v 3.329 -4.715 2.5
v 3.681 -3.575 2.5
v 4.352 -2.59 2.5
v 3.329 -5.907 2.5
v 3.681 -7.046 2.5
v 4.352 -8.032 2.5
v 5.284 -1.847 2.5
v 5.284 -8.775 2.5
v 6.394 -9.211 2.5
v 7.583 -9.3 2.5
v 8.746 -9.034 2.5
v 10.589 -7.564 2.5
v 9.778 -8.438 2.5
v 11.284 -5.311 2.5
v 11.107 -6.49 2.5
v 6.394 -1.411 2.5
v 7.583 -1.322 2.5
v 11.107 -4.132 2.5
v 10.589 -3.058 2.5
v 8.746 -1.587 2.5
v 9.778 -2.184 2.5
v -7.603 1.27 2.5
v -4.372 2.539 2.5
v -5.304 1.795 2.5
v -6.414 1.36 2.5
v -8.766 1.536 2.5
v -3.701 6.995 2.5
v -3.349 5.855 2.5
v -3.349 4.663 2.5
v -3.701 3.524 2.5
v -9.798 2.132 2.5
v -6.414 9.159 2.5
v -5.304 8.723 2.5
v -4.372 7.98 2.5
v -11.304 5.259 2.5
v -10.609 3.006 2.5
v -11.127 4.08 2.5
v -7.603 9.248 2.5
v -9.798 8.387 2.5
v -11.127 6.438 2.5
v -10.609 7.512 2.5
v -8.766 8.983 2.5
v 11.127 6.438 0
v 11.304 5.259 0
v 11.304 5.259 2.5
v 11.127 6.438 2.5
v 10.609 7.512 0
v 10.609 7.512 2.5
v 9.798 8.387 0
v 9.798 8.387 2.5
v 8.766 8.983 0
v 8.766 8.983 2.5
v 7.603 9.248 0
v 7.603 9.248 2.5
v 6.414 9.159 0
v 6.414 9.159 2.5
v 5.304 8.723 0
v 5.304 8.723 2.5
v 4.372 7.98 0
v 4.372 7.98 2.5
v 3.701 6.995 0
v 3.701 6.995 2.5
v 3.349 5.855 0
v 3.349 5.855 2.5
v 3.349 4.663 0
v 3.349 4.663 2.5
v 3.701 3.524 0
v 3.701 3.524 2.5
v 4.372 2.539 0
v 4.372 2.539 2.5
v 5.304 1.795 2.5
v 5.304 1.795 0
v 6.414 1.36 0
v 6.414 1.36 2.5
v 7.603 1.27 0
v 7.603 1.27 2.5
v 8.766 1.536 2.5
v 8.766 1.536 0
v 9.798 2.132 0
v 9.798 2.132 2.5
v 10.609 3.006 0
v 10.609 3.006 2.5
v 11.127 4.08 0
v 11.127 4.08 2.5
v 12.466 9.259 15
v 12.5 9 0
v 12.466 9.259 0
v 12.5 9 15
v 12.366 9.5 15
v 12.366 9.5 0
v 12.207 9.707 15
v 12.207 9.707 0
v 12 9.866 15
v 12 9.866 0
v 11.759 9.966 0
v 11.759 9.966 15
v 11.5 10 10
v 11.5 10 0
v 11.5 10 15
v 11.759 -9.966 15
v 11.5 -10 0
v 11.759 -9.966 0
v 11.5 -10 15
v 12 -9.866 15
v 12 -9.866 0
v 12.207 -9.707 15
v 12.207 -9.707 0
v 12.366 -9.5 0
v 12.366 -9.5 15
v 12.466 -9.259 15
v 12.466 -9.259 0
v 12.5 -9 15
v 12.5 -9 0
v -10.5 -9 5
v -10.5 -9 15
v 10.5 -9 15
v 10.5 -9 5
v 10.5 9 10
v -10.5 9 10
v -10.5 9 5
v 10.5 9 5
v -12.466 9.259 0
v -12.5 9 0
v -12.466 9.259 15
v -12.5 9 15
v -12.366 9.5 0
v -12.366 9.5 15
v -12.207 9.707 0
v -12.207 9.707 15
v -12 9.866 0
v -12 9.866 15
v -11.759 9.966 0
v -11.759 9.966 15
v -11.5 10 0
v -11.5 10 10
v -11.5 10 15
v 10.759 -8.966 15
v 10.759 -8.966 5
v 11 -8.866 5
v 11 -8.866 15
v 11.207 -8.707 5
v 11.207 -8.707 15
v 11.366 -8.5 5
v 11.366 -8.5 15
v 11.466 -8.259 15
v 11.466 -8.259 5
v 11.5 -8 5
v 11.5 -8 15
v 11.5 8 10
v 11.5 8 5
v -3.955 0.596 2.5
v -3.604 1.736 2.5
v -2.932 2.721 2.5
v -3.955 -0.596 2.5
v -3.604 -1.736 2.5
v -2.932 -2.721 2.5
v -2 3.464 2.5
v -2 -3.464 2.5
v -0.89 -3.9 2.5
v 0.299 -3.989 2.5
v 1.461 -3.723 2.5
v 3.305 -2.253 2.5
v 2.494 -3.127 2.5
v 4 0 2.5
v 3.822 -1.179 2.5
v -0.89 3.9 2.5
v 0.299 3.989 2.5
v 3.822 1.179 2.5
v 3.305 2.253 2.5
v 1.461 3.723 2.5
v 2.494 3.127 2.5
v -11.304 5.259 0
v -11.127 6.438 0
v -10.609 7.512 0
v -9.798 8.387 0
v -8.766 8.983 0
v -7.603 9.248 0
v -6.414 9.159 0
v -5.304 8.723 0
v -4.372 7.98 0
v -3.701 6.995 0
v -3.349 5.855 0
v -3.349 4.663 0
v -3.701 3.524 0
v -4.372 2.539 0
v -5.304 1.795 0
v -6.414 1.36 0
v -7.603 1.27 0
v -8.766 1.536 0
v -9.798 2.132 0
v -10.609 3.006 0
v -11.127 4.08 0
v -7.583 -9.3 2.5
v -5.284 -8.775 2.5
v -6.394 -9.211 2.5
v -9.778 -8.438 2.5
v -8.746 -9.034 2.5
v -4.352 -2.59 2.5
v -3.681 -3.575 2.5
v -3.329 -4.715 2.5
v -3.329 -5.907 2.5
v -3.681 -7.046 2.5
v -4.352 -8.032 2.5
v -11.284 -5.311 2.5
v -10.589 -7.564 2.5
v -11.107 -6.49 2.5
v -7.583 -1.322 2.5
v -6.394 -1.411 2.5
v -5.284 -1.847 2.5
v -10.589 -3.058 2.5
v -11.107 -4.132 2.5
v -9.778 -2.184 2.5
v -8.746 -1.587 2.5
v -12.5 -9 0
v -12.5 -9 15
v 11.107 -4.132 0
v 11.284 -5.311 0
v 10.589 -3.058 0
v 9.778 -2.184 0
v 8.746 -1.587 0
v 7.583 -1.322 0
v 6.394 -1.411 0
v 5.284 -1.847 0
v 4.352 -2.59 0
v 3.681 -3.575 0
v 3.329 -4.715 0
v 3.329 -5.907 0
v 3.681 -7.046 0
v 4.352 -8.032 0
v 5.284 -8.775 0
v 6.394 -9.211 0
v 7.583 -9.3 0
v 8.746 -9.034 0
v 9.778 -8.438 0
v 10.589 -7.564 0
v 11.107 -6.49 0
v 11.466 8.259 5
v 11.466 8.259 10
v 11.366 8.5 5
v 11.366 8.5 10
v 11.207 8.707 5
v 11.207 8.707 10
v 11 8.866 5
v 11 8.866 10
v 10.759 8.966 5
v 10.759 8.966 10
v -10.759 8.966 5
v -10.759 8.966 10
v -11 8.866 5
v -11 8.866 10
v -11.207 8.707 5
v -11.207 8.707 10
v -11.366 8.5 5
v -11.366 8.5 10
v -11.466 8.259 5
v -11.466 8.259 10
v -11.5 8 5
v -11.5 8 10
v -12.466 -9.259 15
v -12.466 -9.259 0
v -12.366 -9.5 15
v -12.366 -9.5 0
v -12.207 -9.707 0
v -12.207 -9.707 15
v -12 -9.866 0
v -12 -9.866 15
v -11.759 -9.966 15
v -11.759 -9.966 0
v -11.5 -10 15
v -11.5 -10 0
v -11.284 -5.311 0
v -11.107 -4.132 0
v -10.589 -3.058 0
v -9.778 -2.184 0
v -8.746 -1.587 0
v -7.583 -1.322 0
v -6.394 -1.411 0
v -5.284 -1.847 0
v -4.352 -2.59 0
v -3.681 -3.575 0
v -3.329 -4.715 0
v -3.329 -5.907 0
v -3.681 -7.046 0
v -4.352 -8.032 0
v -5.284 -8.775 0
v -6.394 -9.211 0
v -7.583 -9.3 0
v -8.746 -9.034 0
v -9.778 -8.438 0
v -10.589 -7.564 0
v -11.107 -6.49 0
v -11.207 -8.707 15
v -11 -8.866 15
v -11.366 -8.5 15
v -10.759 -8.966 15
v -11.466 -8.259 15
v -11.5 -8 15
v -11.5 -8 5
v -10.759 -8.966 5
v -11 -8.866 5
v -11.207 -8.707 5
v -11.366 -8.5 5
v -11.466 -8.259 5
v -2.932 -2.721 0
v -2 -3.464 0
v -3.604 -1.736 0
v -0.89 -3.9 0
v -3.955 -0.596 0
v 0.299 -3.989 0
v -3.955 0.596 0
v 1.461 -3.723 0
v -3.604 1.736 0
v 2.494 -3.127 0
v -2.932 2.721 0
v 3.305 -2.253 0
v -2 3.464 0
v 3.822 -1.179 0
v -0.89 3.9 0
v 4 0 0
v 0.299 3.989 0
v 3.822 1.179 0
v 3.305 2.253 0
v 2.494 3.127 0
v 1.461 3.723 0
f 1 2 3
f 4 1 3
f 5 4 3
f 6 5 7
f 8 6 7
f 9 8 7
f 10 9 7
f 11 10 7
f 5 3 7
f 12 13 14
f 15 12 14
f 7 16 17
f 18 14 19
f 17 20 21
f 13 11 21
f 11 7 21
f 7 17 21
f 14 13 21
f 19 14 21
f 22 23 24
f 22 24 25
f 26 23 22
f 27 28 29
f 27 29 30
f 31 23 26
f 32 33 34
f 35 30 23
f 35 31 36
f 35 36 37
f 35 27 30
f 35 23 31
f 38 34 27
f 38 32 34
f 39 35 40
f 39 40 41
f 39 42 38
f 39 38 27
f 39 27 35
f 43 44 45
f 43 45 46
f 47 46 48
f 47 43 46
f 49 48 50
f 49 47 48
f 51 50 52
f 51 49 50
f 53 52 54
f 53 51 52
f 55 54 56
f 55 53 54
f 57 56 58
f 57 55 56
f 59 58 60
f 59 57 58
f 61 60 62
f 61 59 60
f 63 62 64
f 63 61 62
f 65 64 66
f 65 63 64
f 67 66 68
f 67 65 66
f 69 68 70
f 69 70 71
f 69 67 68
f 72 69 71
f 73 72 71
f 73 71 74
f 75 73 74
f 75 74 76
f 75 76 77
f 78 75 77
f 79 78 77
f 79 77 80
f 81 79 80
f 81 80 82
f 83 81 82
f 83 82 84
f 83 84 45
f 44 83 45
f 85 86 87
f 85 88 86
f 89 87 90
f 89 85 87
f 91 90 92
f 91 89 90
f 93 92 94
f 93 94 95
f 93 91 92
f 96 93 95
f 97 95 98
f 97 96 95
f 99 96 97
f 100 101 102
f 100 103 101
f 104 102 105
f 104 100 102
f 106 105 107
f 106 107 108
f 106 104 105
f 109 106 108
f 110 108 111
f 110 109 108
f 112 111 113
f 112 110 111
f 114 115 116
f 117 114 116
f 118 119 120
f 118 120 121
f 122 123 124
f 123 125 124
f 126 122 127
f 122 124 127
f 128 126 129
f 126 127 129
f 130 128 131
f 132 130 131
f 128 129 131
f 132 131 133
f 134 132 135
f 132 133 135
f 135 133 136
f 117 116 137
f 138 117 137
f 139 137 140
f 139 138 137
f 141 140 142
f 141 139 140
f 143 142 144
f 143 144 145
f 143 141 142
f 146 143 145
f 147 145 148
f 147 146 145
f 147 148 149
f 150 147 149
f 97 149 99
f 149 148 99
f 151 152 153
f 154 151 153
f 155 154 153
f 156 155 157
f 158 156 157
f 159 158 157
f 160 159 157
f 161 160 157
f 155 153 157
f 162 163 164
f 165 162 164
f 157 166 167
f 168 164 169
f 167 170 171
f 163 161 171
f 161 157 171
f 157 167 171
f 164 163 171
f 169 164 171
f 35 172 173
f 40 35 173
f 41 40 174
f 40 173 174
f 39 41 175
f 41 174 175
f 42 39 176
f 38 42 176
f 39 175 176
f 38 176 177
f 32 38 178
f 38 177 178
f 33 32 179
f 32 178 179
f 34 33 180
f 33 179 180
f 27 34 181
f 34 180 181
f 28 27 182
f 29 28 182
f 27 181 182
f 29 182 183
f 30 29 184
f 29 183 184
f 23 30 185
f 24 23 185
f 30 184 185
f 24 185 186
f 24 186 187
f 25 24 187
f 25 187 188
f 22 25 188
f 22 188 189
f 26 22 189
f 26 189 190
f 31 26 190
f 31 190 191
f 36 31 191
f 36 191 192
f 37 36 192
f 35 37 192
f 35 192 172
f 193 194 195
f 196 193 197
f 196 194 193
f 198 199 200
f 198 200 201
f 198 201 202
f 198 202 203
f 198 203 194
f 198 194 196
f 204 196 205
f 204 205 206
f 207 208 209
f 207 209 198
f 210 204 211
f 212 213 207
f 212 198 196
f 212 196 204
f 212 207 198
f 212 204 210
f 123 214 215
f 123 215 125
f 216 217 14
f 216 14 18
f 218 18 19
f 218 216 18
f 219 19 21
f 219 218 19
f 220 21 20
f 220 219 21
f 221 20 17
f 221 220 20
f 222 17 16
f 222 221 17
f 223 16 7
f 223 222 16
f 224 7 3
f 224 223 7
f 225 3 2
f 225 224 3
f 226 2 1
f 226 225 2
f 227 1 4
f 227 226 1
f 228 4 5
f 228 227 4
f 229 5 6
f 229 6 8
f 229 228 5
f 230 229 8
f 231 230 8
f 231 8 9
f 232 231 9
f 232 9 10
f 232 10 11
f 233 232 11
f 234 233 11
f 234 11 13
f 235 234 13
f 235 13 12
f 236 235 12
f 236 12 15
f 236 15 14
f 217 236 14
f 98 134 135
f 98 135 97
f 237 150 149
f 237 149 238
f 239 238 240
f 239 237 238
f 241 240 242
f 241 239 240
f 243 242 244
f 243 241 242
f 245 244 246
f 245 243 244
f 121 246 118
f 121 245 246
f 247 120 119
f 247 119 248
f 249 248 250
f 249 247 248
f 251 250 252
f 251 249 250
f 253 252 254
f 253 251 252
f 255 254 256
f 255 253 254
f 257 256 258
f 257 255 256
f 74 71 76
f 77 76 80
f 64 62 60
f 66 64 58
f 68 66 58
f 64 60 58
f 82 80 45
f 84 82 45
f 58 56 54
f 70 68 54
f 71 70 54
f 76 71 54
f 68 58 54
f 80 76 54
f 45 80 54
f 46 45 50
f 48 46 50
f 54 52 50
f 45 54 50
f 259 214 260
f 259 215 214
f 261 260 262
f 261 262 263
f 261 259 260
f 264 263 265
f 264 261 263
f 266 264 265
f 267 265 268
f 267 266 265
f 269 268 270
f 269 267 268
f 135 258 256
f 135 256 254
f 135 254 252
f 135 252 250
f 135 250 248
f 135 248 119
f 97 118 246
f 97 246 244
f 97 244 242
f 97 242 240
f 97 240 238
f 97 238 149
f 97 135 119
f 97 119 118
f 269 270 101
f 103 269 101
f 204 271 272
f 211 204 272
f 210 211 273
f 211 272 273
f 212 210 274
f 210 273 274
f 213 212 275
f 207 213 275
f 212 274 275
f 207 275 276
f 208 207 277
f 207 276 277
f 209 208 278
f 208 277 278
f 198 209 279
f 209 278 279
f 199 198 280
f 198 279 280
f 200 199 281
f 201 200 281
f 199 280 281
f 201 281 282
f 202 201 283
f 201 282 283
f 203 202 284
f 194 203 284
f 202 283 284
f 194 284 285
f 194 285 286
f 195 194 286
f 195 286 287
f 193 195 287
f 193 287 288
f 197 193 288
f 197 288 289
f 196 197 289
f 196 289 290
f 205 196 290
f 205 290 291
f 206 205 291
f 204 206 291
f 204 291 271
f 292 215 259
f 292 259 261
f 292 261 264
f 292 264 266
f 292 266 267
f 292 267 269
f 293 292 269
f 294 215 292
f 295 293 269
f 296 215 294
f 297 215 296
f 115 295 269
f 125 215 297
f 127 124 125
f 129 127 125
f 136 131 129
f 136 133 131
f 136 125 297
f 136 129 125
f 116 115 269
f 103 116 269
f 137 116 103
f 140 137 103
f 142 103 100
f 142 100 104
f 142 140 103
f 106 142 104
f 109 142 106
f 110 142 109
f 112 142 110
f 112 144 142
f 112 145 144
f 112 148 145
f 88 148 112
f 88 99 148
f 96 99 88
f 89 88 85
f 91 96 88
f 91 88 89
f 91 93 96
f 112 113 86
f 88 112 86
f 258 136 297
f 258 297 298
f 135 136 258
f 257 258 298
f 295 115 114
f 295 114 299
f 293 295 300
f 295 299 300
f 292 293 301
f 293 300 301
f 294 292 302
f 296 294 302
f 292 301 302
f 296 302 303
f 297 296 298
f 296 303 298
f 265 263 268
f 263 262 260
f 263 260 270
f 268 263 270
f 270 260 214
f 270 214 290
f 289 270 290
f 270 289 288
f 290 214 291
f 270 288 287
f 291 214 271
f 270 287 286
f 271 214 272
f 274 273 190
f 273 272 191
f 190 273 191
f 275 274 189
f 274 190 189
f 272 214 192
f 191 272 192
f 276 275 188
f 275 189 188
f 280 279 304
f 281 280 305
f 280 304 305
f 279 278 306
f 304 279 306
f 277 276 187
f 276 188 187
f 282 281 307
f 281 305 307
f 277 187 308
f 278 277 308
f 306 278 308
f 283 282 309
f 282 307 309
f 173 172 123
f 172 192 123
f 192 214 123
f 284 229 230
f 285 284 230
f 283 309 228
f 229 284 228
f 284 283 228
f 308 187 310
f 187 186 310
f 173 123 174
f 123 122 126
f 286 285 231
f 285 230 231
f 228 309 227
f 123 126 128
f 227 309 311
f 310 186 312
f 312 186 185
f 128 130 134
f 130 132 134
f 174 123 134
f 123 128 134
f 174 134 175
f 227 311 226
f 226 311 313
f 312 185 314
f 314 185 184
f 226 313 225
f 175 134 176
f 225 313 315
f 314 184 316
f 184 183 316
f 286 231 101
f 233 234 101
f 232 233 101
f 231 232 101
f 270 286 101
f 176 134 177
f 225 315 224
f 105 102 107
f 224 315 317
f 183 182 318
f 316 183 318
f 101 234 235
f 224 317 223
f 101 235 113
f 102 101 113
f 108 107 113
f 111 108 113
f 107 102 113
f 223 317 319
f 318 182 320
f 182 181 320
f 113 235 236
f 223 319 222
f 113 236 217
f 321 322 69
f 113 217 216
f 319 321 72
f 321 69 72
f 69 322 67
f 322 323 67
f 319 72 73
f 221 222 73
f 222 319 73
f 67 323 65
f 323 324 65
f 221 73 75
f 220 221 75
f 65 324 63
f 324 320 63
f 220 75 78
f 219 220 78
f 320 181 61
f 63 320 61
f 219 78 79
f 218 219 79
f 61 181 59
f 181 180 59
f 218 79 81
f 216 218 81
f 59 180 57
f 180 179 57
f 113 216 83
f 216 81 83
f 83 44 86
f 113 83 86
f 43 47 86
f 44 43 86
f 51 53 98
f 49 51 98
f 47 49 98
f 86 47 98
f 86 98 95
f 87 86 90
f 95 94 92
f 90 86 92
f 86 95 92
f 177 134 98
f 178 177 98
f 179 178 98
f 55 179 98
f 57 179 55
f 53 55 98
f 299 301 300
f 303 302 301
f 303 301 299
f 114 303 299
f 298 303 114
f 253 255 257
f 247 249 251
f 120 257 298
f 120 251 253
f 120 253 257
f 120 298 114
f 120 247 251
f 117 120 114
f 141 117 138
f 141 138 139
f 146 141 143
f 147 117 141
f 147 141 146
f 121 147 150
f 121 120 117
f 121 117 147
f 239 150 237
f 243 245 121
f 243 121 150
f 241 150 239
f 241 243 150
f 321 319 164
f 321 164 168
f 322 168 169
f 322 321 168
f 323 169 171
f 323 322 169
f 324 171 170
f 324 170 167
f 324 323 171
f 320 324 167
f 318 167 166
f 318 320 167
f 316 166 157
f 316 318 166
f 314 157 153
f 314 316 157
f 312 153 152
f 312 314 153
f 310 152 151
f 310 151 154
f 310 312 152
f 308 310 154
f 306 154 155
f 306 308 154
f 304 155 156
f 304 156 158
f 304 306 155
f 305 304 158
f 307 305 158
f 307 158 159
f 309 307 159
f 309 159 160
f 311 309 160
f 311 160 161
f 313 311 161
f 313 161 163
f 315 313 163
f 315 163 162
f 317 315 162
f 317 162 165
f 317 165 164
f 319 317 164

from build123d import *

# Parameters (mm, degrees)
ESBO_O1_W                = 25
ESBO_O1_H                = 20
RESSALTO_EXTRUS_O1_DEPTH = 15
FILETE1_R                = 1
ESBO_O2_W                = 23
ESBO_O2_H                = 18
CORTE_EXTRUS_O1_DEPTH    = 10
FILETE2_R                = 1
CORTE_EXTRUS_O6_START    = -1
ESBO_O6_R                = 4
CORTE_EXTRUS_O6_DEPTH    = 3.5
ESBO_O7_W                = 23
ESBO_O7_H                = 5
CORTE_EXTRUS_O7_DEPTH    = 2


with BuildPart() as part:
    # Esboço1 → Ressalto-extrusão1 (new body)
    with BuildSketch(Plane.XY):
        Rectangle(ESBO_O1_W, ESBO_O1_H)
    extrude(amount=RESSALTO_EXTRUS_O1_DEPTH)

    # Filete1
    filete1_edges = [part.edges().sort_by_distance(p)[0] for p in [
        (-12.5, 10, 7.5),
        (12.5, 10, 7.5),
        (12.5, -10, 7.5),
        (-12.5, -10, 7.5),
    ]]
    fillet(filete1_edges, radius=FILETE1_R)

    # Esboço2 → Corte-extrusão1 (cut)
    with BuildSketch(Plane.XY.offset(15)):
        Rectangle(ESBO_O2_W, ESBO_O2_H)
    extrude(amount=-CORTE_EXTRUS_O1_DEPTH, mode=Mode.SUBTRACT)

    # Filete2
    filete2_edges = [part.edges().sort_by_distance(p)[0] for p in [
        (-11.5, -9, 10),
        (-11.5, 9, 10),
        (11.5, 9, 10),
        (11.5, -9, 10),
    ]]
    fillet(filete2_edges, radius=FILETE2_R)

    # Esboço6 → Corte-extrusão6 (cut)
    with BuildSketch(Plane.XY.offset(CORTE_EXTRUS_O6_START)):
        Circle(ESBO_O6_R)
        with Locations((7.304465977, 5.259215503)):
            Circle(ESBO_O6_R)
        with Locations((7.284465974, -5.310841468)):
            Circle(ESBO_O6_R)
    corte_extrus_o6 = extrude(amount=CORTE_EXTRUS_O6_DEPTH, mode=Mode.SUBTRACT)

    # Espelhar1: Corte-extrusão6 across plane
    add(corte_extrus_o6.mirror(Plane(origin=(0, 0, 0), x_dir=(0, 0, 1), z_dir=(1, 0, 0))), mode=Mode.SUBTRACT)

    # Esboço7 → Corte-extrusão7 (cut)
    with BuildSketch(Plane(origin=(0, 10, 0), x_dir=(1, 0, 0), z_dir=(0, 1, 0))):
        with Locations((0, -12.5)):
            Rectangle(ESBO_O7_W, ESBO_O7_H)
    extrude(amount=-CORTE_EXTRUS_O7_DEPTH, mode=Mode.SUBTRACT)


solid = part.part
